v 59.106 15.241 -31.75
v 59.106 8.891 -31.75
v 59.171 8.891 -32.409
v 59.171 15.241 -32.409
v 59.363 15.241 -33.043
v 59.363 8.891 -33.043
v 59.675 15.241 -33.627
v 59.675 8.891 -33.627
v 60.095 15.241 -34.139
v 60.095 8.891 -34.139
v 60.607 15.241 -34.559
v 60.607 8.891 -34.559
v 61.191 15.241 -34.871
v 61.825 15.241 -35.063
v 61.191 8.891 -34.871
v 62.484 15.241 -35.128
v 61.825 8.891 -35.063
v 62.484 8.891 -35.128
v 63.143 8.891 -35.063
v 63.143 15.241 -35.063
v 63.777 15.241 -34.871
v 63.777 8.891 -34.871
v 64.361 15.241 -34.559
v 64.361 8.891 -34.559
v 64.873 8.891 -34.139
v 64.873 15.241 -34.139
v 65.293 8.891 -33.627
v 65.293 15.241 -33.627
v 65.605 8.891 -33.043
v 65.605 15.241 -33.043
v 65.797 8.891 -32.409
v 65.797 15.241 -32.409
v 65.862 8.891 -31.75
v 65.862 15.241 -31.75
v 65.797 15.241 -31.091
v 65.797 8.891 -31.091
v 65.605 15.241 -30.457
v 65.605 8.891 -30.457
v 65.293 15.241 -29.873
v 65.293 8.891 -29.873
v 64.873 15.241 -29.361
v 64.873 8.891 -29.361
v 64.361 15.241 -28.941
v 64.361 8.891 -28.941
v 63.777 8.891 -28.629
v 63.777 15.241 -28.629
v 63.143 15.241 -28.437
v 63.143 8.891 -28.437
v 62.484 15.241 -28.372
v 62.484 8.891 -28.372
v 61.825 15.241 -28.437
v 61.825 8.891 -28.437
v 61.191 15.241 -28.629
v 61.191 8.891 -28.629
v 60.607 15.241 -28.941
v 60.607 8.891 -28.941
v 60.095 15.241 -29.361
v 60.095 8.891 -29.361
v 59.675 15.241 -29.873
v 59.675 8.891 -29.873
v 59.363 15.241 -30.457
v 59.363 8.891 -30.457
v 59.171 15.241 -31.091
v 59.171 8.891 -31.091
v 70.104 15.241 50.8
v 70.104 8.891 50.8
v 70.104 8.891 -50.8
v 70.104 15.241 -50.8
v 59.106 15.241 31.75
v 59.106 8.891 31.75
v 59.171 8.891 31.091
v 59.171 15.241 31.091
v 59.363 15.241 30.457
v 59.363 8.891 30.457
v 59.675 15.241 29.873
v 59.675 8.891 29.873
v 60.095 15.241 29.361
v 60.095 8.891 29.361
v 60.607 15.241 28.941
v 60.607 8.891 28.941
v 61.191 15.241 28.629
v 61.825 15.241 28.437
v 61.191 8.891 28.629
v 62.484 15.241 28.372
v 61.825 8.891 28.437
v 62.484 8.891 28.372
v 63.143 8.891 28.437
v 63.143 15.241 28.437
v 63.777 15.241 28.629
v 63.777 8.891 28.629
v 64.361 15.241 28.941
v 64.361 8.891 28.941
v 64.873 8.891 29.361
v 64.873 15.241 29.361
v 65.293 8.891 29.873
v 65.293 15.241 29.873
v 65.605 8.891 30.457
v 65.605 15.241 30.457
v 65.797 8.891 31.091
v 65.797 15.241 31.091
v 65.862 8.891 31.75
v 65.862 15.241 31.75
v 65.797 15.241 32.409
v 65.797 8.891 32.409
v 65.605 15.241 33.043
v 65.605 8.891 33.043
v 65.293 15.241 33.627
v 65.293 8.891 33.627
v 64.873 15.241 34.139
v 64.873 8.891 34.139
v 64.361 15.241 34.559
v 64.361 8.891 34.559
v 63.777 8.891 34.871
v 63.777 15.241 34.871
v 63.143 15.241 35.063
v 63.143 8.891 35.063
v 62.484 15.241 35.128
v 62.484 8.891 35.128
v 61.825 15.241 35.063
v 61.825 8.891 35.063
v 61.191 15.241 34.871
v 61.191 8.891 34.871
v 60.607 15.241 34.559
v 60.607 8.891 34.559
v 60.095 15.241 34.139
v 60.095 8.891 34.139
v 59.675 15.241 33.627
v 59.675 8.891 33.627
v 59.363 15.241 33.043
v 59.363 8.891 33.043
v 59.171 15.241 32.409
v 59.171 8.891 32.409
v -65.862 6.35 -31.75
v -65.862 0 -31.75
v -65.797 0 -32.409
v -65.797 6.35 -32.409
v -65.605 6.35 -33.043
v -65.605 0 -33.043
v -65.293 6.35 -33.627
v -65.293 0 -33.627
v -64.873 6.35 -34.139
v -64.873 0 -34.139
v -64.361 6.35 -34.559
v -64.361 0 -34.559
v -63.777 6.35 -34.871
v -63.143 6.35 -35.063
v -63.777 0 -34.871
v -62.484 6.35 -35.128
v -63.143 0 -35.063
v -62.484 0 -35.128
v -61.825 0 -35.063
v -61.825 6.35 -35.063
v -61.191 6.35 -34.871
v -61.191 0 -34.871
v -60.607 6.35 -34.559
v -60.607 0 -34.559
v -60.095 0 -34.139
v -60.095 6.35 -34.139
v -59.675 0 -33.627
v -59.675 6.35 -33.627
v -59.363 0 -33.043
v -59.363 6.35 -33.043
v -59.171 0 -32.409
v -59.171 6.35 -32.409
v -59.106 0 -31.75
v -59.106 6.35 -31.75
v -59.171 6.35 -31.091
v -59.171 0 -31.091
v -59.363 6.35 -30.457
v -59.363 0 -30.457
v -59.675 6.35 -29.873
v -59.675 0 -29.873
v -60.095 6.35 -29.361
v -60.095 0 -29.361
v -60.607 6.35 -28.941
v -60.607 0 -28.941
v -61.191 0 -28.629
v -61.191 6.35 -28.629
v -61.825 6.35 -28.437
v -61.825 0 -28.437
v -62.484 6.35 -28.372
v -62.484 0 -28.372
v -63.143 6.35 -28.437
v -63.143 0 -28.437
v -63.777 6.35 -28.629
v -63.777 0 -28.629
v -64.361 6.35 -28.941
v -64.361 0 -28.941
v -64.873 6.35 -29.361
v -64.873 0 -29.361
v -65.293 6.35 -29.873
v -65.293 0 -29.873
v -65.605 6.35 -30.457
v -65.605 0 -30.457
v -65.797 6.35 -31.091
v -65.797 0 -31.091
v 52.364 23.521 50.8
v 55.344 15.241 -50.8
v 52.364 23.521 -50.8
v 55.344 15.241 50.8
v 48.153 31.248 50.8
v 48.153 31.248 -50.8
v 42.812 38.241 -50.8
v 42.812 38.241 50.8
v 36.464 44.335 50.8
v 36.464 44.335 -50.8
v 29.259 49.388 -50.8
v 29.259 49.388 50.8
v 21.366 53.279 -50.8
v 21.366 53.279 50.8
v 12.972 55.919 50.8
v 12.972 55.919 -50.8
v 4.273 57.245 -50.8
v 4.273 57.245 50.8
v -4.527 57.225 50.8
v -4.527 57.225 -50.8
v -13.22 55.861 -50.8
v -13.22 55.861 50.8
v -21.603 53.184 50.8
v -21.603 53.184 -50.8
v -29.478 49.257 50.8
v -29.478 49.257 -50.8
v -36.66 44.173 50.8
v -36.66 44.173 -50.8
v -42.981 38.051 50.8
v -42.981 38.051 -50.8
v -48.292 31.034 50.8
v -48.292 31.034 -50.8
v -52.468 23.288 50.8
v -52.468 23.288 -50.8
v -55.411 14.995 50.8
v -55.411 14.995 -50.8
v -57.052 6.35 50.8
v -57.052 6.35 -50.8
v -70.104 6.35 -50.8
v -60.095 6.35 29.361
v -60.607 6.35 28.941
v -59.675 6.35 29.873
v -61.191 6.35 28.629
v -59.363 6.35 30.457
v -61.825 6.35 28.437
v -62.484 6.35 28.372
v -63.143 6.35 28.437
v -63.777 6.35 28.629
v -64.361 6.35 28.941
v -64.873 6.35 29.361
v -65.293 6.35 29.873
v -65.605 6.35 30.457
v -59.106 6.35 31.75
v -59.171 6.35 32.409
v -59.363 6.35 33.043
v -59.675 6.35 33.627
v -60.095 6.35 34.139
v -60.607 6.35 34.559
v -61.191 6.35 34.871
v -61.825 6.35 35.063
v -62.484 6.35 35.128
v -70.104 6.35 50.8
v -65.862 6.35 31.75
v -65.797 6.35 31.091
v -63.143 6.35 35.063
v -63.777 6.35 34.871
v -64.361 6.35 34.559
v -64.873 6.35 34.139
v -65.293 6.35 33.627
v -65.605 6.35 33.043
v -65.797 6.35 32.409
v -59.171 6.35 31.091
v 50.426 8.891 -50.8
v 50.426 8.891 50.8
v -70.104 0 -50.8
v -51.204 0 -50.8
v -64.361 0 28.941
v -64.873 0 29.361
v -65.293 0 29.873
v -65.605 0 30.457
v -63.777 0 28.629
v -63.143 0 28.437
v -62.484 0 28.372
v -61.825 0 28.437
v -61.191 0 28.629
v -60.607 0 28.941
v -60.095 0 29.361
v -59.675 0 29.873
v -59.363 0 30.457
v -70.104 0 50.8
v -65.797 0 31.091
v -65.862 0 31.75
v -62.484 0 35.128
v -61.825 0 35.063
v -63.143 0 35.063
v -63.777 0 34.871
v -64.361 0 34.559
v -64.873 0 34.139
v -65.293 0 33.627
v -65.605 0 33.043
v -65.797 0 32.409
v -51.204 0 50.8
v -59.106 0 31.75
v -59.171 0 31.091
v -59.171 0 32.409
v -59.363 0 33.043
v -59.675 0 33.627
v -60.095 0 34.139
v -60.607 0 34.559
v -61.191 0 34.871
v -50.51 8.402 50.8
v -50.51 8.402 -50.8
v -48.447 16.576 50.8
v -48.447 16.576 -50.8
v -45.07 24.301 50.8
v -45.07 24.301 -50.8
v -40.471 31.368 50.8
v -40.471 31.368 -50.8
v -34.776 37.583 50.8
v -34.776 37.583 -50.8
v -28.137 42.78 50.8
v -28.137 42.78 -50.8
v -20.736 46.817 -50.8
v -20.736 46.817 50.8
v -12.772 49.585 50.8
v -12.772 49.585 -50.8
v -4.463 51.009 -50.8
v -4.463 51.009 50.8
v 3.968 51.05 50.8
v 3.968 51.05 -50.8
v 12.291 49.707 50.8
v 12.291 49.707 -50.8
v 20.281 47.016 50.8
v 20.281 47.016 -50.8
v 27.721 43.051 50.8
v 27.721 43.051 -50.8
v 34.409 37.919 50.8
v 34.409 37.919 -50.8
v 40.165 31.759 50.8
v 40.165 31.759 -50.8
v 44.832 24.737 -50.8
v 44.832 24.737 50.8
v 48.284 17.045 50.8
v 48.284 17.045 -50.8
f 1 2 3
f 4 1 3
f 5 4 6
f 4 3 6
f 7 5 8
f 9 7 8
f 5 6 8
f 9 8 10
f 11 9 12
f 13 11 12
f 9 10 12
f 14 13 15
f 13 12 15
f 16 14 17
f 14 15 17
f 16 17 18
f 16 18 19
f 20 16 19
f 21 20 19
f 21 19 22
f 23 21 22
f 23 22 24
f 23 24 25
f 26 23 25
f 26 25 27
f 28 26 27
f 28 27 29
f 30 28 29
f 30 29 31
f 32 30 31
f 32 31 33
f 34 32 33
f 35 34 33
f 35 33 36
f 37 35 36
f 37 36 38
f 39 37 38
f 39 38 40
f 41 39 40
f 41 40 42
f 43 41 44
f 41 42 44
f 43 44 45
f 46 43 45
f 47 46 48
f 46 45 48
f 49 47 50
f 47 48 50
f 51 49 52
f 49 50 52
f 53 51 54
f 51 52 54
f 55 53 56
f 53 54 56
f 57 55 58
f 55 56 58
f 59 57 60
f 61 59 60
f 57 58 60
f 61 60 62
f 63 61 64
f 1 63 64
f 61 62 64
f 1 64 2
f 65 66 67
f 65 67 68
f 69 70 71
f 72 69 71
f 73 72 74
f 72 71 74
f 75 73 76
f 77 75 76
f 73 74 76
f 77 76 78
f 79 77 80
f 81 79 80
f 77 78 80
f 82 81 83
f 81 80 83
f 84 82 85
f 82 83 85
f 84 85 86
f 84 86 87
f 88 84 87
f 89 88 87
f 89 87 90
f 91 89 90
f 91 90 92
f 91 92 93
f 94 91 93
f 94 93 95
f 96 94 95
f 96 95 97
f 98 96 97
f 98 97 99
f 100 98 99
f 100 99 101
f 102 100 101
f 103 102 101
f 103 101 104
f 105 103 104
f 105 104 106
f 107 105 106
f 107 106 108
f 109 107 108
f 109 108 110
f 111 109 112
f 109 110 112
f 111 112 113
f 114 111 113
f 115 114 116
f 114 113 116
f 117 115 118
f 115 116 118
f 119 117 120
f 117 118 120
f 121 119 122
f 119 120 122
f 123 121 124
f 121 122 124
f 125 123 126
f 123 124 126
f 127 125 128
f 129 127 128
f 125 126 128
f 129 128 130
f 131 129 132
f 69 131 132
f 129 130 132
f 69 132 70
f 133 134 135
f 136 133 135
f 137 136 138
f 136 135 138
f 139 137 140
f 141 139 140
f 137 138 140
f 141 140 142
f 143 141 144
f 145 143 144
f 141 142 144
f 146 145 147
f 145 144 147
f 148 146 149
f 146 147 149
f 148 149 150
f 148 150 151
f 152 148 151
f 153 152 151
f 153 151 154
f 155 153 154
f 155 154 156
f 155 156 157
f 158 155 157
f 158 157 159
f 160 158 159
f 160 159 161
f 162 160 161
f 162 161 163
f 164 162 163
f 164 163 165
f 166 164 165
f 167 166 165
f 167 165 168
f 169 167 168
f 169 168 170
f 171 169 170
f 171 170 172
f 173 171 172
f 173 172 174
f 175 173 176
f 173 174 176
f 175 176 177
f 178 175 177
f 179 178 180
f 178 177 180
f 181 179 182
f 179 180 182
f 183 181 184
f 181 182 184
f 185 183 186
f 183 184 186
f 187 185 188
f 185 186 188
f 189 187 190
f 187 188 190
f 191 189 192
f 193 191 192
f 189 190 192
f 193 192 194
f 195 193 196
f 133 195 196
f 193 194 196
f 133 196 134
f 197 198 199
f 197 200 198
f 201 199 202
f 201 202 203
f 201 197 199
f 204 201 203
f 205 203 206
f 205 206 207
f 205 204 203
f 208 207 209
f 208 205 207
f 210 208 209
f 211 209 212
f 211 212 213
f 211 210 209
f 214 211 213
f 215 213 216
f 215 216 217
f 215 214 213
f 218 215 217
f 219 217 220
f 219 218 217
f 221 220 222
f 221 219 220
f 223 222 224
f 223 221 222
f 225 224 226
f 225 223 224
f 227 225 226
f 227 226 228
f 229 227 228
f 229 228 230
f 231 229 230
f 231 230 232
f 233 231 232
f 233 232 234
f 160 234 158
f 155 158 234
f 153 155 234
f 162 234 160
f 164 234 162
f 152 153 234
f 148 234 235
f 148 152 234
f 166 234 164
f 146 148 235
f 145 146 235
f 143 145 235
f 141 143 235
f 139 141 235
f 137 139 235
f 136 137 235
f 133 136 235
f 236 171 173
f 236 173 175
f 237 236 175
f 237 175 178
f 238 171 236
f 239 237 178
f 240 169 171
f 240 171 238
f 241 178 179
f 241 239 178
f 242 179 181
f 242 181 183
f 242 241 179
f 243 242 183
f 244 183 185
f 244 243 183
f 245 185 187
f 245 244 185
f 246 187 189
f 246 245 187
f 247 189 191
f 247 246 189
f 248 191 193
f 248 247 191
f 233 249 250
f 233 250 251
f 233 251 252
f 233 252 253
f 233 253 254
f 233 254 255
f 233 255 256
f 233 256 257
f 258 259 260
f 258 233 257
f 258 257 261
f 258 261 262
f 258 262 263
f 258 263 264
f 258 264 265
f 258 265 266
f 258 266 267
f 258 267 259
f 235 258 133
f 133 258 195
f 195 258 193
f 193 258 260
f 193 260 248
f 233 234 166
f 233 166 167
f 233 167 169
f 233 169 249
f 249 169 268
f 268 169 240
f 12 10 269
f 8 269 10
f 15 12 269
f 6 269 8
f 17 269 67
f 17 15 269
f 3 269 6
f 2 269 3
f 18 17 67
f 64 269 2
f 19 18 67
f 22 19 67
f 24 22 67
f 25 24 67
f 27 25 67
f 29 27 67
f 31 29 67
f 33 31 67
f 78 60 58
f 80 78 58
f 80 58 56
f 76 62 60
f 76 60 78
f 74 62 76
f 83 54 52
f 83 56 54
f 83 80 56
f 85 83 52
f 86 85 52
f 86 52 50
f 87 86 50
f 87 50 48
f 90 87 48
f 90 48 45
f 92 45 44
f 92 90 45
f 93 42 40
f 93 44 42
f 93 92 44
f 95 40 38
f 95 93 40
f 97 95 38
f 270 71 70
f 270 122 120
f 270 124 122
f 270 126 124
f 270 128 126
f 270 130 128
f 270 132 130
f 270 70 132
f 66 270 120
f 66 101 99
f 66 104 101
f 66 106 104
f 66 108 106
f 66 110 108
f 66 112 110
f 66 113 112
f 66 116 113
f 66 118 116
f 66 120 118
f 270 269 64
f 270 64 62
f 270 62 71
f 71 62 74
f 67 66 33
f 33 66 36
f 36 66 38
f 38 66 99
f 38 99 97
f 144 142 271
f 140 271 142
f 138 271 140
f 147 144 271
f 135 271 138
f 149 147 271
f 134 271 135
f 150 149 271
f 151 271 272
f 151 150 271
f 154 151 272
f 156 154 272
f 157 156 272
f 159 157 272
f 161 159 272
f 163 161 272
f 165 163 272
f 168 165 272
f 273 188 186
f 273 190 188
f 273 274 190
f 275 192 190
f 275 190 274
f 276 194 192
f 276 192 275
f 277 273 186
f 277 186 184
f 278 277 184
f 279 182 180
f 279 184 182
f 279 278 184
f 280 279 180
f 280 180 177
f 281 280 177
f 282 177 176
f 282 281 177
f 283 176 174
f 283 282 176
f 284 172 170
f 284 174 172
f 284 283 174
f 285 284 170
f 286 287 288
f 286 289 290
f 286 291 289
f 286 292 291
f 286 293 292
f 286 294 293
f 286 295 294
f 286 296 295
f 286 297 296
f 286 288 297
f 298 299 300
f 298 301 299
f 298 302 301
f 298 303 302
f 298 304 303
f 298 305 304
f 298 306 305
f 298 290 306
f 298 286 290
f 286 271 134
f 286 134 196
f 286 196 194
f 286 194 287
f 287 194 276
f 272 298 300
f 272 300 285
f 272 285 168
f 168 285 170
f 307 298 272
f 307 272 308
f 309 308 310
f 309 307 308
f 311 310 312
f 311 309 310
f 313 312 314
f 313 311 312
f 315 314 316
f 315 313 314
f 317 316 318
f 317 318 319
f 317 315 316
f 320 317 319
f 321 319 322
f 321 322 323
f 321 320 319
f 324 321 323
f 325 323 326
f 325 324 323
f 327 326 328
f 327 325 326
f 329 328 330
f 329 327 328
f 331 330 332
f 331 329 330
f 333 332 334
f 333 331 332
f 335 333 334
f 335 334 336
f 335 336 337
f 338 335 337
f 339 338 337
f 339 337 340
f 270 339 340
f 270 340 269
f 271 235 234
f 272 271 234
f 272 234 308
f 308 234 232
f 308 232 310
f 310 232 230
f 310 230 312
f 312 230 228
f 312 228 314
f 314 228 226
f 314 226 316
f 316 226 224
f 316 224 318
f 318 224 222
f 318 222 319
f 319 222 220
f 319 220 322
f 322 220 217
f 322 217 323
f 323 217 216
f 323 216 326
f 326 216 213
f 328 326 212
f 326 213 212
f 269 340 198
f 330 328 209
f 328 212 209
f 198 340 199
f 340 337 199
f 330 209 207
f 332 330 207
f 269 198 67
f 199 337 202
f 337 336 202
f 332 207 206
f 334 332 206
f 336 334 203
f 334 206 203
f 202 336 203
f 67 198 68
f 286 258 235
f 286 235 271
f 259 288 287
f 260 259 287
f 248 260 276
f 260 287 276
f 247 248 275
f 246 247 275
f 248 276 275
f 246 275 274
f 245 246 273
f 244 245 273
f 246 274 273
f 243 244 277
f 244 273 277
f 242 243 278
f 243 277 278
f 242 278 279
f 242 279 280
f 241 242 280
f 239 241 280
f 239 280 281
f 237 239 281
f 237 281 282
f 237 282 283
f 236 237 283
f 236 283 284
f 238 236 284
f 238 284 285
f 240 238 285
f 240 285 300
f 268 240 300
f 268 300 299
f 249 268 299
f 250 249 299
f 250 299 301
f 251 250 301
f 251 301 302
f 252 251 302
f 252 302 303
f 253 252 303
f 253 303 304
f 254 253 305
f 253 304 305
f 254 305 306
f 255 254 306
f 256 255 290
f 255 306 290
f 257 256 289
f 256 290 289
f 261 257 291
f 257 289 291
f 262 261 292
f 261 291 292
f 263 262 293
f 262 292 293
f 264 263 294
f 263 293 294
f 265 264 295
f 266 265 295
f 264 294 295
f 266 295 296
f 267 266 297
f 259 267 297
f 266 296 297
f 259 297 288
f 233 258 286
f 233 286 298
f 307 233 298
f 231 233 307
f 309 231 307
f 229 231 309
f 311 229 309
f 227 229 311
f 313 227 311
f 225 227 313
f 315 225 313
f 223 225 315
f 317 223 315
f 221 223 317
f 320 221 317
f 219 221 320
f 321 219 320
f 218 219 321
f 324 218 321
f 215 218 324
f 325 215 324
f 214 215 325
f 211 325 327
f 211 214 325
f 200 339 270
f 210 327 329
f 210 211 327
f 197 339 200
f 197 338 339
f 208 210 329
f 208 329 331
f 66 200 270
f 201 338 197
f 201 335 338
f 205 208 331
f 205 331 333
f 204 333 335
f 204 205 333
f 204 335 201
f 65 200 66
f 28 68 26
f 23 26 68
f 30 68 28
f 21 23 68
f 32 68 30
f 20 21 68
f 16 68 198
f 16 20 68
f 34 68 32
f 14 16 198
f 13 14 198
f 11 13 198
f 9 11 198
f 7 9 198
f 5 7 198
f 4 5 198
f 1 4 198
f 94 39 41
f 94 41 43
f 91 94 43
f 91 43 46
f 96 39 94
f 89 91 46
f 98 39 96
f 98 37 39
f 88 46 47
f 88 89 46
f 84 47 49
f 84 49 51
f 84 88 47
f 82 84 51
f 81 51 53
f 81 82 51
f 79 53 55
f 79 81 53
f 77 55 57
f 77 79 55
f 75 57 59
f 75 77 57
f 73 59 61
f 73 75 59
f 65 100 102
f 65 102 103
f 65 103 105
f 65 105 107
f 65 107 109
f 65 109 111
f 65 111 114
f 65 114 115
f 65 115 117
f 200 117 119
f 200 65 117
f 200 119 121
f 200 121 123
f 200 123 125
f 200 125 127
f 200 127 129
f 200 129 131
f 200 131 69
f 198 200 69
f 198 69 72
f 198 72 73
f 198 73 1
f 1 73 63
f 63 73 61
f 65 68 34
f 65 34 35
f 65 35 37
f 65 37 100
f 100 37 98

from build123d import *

# Parameters (mm, degrees)
BOSS_EXTRUDE1_DEPTH     = 50.8
F_1_4_CLEARANCE_HOLE1_D = 6.7564
F_1_4_CLEARANCE_HOLE2_D = 6.7564


with BuildPart() as part:
    # Sketch1 → Boss-Extrude1 (new body, symmetric)
    with BuildSketch(Plane.XY):
        with BuildLine():
            Line((-57.051702131, 6.35), (-70.104, 6.35))
            Line((-70.104, 6.35), (-70.104, 0))
            Line((-70.104, 0), (-51.203999954, 0))
            ThreePointArc((-51.203999954, 0), (-4.462722648, 51.009153275), (50.42609614, 8.891481281))
            Line((50.42609614, 8.891481281), (70.104, 8.891481281))
            Line((70.104, 8.891481281), (70.104, 15.241481281))
            Line((70.104, 15.241481281), (55.343621713, 15.241481281))
            ThreePointArc((55.343621713, 15.241481281), (-4.527029326, 57.22521491), (-57.051702131, 6.35))
        make_face()
    extrude(amount=BOSS_EXTRUDE1_DEPTH, both=True)

    # 1/4 Clearance Hole1 (through all)
    with Locations(Plane(origin=(0, 6.35, 0), x_dir=(1, 0, 0), z_dir=(0, 1, 0))):
        with Locations((-62.484, -31.75), (-62.484, 31.75)):
            Hole(F_1_4_CLEARANCE_HOLE1_D / 2)

    # 1/4 Clearance Hole2 (through all)
    with Locations(Plane(origin=(0, 15.241481281, 0), x_dir=(1, 0, 0), z_dir=(0, 1, 0))):
        with Locations((62.484, -31.75), (62.484, 31.75)):
            Hole(F_1_4_CLEARANCE_HOLE2_D / 2)


solid = part.part
